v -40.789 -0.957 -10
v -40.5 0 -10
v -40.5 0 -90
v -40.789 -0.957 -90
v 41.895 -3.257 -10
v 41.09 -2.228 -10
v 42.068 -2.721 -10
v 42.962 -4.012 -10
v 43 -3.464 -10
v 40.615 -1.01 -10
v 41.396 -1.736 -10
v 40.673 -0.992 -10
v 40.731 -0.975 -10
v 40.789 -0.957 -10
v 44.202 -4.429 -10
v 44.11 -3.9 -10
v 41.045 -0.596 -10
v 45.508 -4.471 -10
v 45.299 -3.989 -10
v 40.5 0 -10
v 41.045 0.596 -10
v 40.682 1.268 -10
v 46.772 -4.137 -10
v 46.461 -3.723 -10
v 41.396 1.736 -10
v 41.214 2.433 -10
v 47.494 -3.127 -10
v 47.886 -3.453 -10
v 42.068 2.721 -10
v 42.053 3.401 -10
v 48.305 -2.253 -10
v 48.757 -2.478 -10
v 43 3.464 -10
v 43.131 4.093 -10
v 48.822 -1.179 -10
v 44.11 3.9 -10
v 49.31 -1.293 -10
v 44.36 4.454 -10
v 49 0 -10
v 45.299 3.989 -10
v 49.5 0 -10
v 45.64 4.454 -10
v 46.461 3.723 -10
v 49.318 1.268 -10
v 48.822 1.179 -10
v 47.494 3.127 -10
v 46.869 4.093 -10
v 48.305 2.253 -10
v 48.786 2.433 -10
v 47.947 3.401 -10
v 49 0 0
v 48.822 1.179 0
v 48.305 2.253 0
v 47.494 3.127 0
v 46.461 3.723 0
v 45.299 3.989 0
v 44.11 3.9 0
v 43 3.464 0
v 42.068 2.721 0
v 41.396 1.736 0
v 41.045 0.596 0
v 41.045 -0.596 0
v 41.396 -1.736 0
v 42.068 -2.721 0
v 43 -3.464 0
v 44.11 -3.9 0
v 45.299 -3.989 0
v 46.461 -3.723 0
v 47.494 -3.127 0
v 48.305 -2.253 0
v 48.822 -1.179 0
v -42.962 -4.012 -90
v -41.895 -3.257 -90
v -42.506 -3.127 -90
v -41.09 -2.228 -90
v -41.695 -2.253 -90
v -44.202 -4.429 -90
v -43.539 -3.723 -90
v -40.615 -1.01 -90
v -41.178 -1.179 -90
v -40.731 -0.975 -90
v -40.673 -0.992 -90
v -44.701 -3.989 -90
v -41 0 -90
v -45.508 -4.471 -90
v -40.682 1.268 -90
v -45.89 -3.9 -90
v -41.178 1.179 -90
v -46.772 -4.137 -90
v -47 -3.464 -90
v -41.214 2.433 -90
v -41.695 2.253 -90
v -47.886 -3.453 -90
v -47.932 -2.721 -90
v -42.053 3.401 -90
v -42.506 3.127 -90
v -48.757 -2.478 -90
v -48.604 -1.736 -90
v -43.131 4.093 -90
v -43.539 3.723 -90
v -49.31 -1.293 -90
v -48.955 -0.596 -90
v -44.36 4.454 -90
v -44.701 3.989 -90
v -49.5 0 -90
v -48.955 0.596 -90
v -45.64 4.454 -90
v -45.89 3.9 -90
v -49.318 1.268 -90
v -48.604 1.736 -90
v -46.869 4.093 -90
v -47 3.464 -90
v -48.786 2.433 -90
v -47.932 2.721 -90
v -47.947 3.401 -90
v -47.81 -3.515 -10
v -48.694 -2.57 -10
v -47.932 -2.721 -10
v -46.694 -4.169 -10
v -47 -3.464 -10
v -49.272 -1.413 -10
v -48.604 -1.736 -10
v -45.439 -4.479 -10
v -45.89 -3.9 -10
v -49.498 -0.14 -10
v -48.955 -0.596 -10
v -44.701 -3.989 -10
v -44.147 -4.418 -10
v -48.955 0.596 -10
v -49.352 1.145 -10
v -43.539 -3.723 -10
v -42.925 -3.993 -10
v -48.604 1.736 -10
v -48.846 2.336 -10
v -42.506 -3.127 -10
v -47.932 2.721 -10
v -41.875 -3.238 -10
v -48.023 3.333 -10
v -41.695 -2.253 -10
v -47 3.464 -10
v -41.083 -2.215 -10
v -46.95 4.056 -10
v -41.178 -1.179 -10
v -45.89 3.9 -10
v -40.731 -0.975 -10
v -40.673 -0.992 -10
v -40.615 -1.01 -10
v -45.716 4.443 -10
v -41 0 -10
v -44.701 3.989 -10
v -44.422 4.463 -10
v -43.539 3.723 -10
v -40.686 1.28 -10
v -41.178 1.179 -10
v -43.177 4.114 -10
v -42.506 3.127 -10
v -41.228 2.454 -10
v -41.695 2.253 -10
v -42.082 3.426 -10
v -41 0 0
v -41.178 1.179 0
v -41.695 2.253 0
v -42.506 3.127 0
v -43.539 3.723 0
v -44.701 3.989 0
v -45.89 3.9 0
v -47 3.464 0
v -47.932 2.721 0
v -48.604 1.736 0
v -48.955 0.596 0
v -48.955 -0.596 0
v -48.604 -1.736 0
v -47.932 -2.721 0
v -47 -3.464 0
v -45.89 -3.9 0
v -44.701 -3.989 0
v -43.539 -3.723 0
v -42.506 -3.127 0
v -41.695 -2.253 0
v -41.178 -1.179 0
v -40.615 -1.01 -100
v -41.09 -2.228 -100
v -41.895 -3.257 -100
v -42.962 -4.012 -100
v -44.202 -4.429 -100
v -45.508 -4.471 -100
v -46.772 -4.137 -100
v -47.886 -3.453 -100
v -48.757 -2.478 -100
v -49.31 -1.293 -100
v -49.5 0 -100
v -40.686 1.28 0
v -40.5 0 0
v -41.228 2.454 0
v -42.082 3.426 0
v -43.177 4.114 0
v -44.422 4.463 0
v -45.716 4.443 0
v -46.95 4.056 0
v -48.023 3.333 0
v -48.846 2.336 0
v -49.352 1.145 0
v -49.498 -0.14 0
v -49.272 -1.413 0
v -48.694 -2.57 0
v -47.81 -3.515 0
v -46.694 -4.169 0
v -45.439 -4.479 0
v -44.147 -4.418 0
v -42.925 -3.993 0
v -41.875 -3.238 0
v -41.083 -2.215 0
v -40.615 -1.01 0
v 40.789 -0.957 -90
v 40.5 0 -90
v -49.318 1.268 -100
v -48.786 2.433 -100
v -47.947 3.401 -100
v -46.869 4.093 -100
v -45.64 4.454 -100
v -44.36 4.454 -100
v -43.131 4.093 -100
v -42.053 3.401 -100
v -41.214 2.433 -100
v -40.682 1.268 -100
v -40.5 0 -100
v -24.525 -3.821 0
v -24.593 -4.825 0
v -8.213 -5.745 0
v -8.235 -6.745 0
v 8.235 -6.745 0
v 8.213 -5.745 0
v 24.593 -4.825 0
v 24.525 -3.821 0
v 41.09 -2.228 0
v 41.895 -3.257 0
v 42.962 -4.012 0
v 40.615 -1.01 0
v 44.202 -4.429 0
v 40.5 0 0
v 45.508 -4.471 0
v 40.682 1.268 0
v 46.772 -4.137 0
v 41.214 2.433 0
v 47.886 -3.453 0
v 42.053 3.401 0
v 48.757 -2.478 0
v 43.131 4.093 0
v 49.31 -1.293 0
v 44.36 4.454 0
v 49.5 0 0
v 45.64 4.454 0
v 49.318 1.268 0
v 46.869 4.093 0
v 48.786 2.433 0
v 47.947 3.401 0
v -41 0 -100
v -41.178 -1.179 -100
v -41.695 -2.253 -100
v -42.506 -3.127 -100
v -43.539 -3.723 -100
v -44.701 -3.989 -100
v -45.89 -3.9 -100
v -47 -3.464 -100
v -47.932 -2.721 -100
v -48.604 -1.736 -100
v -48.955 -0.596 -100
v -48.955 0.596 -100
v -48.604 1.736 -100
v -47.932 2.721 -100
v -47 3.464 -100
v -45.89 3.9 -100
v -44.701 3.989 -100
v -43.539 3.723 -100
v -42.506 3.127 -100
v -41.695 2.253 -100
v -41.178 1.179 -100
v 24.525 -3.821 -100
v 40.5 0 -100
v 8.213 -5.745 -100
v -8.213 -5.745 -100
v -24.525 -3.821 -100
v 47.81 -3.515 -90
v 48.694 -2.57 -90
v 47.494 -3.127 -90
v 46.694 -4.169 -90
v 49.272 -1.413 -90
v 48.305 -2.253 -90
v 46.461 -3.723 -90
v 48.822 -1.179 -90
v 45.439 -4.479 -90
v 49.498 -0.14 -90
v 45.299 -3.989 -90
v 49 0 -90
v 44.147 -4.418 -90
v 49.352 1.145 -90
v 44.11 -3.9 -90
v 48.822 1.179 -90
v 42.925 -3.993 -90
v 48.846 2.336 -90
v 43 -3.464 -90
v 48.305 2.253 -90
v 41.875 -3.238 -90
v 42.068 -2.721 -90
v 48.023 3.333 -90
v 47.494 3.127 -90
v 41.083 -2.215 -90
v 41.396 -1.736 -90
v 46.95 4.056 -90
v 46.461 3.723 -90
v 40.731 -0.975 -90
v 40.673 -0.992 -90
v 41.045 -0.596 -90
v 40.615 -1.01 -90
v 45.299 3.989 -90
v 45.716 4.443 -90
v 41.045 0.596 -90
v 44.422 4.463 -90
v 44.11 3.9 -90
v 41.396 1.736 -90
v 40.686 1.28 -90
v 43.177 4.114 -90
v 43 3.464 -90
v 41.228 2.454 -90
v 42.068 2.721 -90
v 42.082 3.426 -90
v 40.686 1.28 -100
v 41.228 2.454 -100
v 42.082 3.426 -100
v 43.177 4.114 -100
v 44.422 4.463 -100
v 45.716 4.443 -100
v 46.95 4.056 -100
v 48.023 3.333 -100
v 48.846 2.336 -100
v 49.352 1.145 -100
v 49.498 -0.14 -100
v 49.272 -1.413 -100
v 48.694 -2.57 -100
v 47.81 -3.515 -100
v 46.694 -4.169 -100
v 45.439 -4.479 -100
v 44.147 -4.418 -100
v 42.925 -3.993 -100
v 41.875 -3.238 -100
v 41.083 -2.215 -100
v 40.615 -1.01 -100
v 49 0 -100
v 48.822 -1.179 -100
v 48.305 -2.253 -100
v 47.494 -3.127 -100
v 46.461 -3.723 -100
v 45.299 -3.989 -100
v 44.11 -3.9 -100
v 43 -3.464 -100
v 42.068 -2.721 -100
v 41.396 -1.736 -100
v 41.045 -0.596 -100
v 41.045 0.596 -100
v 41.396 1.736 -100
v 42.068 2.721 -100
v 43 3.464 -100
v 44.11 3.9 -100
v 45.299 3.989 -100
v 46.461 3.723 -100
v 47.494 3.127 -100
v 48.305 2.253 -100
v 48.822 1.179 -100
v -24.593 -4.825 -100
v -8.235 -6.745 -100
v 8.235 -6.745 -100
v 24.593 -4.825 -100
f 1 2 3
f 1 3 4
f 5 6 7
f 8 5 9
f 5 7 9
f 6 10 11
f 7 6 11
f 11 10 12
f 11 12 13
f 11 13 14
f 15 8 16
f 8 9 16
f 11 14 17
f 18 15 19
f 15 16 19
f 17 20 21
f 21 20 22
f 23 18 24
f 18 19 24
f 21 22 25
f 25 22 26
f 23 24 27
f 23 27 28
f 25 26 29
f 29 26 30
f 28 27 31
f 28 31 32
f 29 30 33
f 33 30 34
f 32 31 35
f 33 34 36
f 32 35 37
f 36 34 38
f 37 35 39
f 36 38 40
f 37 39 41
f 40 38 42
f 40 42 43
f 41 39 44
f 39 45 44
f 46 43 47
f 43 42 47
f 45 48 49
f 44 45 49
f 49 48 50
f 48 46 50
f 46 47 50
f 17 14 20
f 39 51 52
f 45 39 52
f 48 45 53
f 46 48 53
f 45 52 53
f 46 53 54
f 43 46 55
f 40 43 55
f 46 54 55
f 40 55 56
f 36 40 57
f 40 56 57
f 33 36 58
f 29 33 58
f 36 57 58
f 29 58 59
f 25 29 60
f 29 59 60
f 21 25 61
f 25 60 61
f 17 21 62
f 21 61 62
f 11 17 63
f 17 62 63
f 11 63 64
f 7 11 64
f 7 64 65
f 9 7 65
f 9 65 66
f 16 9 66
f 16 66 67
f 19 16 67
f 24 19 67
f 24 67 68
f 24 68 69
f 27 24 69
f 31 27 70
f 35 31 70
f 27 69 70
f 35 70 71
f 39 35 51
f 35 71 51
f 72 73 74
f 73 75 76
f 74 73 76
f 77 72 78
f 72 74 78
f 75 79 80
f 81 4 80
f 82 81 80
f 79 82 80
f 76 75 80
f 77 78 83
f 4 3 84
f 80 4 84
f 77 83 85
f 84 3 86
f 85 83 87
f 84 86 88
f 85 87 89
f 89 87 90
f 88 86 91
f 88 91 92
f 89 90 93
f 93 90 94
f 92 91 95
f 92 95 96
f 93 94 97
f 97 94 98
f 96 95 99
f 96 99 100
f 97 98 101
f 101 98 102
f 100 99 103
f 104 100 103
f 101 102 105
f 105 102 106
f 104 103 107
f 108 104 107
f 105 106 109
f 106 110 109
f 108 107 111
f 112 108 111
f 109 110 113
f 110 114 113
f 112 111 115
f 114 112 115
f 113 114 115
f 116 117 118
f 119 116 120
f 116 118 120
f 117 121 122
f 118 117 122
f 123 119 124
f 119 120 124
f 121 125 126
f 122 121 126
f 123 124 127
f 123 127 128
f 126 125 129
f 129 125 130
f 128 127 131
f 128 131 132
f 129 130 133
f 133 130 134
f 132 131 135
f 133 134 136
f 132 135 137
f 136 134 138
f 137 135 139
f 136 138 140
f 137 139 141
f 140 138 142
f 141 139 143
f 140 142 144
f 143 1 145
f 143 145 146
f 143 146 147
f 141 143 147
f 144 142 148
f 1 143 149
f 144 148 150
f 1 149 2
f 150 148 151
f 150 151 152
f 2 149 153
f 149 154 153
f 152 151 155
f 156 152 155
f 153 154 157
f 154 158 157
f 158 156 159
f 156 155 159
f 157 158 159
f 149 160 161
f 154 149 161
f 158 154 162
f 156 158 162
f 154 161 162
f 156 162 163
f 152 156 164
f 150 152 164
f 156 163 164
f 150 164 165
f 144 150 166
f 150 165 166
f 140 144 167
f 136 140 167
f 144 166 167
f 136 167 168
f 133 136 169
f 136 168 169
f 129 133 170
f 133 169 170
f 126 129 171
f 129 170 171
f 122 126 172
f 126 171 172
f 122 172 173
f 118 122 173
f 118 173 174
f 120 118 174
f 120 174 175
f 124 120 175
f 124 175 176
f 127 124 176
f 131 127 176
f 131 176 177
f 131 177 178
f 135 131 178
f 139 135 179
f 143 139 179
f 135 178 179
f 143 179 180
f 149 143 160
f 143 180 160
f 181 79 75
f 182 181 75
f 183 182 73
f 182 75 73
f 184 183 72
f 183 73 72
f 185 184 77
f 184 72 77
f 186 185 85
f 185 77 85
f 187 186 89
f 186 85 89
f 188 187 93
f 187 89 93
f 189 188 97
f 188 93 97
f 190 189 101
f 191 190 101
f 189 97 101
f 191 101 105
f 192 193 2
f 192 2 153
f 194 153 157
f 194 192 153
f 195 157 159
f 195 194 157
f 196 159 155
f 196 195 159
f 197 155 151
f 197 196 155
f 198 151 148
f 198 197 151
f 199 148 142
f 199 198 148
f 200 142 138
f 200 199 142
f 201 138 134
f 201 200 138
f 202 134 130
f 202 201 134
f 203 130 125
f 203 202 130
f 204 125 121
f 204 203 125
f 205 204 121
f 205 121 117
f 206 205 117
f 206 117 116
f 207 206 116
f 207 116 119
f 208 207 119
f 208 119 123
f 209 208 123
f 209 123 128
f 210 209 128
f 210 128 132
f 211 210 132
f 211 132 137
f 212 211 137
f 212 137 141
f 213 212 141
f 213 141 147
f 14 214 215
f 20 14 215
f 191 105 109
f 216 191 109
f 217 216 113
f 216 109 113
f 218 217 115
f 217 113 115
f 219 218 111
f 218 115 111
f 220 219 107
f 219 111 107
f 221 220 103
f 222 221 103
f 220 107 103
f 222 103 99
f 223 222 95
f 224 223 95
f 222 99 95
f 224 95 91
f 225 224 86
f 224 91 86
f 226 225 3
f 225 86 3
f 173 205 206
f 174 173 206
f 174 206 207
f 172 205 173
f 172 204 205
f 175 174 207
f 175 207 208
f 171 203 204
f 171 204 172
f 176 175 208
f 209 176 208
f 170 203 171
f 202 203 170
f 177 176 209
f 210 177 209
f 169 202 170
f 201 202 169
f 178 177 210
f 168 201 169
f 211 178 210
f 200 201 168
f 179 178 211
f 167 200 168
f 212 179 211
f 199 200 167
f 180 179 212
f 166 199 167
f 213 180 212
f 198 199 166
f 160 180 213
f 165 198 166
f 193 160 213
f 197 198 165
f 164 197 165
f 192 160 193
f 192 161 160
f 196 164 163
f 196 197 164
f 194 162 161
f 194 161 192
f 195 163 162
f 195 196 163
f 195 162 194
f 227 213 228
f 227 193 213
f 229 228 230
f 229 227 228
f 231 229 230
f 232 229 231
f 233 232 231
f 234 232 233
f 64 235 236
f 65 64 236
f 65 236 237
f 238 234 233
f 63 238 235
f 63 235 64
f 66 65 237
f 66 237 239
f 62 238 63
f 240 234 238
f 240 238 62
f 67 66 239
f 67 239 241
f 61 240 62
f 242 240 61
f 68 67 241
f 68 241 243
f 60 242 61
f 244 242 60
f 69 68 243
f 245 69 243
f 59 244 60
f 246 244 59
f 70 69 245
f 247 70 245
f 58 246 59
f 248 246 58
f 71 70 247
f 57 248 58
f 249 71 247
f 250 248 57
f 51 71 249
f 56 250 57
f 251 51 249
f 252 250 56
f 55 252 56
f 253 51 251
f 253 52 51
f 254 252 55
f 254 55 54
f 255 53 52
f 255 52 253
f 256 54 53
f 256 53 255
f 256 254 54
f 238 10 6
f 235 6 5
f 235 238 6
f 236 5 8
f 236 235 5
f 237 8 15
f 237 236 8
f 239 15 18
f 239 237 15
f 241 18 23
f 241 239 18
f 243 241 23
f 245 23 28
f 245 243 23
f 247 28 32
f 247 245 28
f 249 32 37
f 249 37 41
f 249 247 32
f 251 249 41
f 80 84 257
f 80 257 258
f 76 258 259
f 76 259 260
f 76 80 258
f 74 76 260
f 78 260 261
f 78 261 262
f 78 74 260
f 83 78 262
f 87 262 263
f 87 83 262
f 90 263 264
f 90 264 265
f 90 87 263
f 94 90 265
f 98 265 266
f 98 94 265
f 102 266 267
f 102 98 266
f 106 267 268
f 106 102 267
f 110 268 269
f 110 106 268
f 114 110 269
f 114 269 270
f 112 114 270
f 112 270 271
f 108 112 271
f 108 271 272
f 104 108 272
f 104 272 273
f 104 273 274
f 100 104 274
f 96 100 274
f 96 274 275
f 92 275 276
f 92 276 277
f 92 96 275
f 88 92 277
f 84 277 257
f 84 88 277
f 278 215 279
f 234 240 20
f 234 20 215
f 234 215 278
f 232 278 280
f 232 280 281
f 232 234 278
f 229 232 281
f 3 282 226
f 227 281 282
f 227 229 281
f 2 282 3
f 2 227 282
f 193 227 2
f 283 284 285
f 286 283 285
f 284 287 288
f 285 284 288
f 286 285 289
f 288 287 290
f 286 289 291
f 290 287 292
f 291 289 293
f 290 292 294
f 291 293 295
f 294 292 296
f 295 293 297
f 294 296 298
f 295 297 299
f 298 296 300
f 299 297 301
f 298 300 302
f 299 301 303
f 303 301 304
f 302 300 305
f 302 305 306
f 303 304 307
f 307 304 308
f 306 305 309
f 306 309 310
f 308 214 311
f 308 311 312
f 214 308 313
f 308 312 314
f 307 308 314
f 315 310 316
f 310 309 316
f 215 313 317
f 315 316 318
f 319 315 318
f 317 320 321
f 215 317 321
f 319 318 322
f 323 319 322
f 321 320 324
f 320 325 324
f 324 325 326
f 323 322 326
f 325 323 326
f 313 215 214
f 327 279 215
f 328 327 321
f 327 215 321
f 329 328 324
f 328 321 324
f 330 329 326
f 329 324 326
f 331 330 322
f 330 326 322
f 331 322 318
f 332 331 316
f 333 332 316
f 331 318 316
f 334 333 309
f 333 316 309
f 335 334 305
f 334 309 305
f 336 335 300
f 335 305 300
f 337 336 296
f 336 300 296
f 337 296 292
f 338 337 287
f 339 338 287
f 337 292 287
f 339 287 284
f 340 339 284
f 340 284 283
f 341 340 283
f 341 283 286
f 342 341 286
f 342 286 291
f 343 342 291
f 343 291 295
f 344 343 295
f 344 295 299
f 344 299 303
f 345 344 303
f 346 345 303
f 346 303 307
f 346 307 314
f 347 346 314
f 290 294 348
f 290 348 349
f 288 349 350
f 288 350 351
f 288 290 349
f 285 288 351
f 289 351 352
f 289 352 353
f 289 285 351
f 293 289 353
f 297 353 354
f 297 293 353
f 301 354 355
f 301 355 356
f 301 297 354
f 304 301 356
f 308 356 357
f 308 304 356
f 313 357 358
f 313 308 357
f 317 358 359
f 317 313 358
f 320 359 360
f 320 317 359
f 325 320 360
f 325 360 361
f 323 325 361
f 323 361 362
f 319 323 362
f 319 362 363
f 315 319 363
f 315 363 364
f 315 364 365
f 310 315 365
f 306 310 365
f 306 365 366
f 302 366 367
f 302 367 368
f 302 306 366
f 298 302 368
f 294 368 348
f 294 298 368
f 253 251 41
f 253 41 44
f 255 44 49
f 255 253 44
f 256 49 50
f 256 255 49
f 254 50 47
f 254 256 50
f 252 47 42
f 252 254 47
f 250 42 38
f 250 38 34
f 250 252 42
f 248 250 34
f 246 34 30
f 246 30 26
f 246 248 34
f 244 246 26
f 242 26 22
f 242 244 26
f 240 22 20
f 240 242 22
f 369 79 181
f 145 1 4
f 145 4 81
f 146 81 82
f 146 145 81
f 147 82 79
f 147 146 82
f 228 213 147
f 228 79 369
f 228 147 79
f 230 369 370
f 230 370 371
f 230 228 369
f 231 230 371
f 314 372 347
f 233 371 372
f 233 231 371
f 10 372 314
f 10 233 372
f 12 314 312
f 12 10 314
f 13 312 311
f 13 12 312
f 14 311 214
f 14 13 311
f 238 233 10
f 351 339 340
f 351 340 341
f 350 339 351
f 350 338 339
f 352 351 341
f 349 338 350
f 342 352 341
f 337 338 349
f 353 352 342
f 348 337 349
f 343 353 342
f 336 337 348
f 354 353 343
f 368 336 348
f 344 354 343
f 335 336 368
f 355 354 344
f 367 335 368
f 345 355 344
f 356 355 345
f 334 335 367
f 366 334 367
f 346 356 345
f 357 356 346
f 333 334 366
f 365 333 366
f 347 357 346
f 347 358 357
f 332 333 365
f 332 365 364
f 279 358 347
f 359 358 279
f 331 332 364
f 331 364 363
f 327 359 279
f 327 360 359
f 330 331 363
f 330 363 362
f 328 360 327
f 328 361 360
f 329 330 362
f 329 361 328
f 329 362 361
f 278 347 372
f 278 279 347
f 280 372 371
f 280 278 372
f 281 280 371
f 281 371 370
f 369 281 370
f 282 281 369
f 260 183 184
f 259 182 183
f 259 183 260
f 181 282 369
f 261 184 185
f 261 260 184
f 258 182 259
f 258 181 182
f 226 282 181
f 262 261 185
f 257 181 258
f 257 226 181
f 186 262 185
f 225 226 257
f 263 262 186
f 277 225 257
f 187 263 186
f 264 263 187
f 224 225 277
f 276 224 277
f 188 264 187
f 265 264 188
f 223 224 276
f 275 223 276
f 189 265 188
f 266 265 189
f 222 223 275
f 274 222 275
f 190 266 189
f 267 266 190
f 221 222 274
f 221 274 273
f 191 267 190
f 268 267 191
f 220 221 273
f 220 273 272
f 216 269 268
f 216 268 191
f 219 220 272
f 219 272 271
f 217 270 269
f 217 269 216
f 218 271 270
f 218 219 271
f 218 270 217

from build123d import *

# Parameters (mm, degrees)
SKETCH1_R             = 4.5
SKETCH1_R_2           = 4
BOSS_EXTRUDE1_DEPTH   = 10
BOSS_EXTRUDE1_2_DEPTH = 10
BOSS_EXTRUDE4_DEPTH   = 100
BOSS_EXTRUDE5_START   = -10
SKETCH4_R             = 4.5
SKETCH4_R_2           = 4
BOSS_EXTRUDE5_DEPTH   = 10


with BuildPart() as part:
    # Sketch1 → Boss-Extrude1 (new body)
    with BuildSketch(Plane.XY):
        with Locations((-45, 0)):
            Circle(SKETCH1_R)
        with Locations((-45, 0)):
            Circle(SKETCH1_R_2, mode=Mode.SUBTRACT)
    extrude(amount=-BOSS_EXTRUDE1_DEPTH)



with BuildPart() as body_2:
    # Sketch1 → Boss-Extrude1 2 (new body)
    with BuildSketch(Plane.XY):
        with Locations((45, 0)):
            Circle(SKETCH1_R)
        with Locations((45, 0)):
            Circle(SKETCH1_R_2, mode=Mode.SUBTRACT)
    extrude(amount=-BOSS_EXTRUDE1_2_DEPTH)


with BuildPart() as part_1:
    add(part.part)

    add(body_2.part)  # Boss-Extrude4 merges body 2
    # Sketch2 → Boss-Extrude4 (add)
    with BuildSketch(Plane.XY):
        with BuildLine():
            Line((-40.5, 0), (-40.789285714, -0.957242799))
            ThreePointArc((-40.789285714, -0.957242799), (0, -6.986008193), (40.789285714, -0.957242799))
            Line((40.789285714, -0.957242799), (40.5, 0))
            ThreePointArc((40.5, 0), (0, -5.986008193), (-40.5, 0))
        make_face()
    extrude(amount=-BOSS_EXTRUDE4_DEPTH)

    # Sketch4 → Boss-Extrude5 (add)
    # profile 1 of 2: a face of its own
    with BuildSketch(Plane(origin=(0, 0, -100), x_dir=(-1, 0, 0), z_dir=(0, 0, -1)).offset(BOSS_EXTRUDE5_START)):
        with Locations((45, 0)):
            Circle(SKETCH4_R)
        with Locations(Location((45, 0, 0), (0, 0, 180))):
            Circle(SKETCH4_R_2, mode=Mode.SUBTRACT)
    # profile 2 of 2: a face of its own
    with BuildSketch(Plane(origin=(0, 0, -100), x_dir=(-1, 0, 0), z_dir=(0, 0, -1)).offset(BOSS_EXTRUDE5_START)):
        with Locations((-45, 0)):
            Circle(SKETCH4_R)
        with Locations(Location((-45, 0, 0), (0, 0, 180))):
            Circle(SKETCH4_R_2, mode=Mode.SUBTRACT)
    extrude(amount=BOSS_EXTRUDE5_DEPTH)


solid = part_1.part
